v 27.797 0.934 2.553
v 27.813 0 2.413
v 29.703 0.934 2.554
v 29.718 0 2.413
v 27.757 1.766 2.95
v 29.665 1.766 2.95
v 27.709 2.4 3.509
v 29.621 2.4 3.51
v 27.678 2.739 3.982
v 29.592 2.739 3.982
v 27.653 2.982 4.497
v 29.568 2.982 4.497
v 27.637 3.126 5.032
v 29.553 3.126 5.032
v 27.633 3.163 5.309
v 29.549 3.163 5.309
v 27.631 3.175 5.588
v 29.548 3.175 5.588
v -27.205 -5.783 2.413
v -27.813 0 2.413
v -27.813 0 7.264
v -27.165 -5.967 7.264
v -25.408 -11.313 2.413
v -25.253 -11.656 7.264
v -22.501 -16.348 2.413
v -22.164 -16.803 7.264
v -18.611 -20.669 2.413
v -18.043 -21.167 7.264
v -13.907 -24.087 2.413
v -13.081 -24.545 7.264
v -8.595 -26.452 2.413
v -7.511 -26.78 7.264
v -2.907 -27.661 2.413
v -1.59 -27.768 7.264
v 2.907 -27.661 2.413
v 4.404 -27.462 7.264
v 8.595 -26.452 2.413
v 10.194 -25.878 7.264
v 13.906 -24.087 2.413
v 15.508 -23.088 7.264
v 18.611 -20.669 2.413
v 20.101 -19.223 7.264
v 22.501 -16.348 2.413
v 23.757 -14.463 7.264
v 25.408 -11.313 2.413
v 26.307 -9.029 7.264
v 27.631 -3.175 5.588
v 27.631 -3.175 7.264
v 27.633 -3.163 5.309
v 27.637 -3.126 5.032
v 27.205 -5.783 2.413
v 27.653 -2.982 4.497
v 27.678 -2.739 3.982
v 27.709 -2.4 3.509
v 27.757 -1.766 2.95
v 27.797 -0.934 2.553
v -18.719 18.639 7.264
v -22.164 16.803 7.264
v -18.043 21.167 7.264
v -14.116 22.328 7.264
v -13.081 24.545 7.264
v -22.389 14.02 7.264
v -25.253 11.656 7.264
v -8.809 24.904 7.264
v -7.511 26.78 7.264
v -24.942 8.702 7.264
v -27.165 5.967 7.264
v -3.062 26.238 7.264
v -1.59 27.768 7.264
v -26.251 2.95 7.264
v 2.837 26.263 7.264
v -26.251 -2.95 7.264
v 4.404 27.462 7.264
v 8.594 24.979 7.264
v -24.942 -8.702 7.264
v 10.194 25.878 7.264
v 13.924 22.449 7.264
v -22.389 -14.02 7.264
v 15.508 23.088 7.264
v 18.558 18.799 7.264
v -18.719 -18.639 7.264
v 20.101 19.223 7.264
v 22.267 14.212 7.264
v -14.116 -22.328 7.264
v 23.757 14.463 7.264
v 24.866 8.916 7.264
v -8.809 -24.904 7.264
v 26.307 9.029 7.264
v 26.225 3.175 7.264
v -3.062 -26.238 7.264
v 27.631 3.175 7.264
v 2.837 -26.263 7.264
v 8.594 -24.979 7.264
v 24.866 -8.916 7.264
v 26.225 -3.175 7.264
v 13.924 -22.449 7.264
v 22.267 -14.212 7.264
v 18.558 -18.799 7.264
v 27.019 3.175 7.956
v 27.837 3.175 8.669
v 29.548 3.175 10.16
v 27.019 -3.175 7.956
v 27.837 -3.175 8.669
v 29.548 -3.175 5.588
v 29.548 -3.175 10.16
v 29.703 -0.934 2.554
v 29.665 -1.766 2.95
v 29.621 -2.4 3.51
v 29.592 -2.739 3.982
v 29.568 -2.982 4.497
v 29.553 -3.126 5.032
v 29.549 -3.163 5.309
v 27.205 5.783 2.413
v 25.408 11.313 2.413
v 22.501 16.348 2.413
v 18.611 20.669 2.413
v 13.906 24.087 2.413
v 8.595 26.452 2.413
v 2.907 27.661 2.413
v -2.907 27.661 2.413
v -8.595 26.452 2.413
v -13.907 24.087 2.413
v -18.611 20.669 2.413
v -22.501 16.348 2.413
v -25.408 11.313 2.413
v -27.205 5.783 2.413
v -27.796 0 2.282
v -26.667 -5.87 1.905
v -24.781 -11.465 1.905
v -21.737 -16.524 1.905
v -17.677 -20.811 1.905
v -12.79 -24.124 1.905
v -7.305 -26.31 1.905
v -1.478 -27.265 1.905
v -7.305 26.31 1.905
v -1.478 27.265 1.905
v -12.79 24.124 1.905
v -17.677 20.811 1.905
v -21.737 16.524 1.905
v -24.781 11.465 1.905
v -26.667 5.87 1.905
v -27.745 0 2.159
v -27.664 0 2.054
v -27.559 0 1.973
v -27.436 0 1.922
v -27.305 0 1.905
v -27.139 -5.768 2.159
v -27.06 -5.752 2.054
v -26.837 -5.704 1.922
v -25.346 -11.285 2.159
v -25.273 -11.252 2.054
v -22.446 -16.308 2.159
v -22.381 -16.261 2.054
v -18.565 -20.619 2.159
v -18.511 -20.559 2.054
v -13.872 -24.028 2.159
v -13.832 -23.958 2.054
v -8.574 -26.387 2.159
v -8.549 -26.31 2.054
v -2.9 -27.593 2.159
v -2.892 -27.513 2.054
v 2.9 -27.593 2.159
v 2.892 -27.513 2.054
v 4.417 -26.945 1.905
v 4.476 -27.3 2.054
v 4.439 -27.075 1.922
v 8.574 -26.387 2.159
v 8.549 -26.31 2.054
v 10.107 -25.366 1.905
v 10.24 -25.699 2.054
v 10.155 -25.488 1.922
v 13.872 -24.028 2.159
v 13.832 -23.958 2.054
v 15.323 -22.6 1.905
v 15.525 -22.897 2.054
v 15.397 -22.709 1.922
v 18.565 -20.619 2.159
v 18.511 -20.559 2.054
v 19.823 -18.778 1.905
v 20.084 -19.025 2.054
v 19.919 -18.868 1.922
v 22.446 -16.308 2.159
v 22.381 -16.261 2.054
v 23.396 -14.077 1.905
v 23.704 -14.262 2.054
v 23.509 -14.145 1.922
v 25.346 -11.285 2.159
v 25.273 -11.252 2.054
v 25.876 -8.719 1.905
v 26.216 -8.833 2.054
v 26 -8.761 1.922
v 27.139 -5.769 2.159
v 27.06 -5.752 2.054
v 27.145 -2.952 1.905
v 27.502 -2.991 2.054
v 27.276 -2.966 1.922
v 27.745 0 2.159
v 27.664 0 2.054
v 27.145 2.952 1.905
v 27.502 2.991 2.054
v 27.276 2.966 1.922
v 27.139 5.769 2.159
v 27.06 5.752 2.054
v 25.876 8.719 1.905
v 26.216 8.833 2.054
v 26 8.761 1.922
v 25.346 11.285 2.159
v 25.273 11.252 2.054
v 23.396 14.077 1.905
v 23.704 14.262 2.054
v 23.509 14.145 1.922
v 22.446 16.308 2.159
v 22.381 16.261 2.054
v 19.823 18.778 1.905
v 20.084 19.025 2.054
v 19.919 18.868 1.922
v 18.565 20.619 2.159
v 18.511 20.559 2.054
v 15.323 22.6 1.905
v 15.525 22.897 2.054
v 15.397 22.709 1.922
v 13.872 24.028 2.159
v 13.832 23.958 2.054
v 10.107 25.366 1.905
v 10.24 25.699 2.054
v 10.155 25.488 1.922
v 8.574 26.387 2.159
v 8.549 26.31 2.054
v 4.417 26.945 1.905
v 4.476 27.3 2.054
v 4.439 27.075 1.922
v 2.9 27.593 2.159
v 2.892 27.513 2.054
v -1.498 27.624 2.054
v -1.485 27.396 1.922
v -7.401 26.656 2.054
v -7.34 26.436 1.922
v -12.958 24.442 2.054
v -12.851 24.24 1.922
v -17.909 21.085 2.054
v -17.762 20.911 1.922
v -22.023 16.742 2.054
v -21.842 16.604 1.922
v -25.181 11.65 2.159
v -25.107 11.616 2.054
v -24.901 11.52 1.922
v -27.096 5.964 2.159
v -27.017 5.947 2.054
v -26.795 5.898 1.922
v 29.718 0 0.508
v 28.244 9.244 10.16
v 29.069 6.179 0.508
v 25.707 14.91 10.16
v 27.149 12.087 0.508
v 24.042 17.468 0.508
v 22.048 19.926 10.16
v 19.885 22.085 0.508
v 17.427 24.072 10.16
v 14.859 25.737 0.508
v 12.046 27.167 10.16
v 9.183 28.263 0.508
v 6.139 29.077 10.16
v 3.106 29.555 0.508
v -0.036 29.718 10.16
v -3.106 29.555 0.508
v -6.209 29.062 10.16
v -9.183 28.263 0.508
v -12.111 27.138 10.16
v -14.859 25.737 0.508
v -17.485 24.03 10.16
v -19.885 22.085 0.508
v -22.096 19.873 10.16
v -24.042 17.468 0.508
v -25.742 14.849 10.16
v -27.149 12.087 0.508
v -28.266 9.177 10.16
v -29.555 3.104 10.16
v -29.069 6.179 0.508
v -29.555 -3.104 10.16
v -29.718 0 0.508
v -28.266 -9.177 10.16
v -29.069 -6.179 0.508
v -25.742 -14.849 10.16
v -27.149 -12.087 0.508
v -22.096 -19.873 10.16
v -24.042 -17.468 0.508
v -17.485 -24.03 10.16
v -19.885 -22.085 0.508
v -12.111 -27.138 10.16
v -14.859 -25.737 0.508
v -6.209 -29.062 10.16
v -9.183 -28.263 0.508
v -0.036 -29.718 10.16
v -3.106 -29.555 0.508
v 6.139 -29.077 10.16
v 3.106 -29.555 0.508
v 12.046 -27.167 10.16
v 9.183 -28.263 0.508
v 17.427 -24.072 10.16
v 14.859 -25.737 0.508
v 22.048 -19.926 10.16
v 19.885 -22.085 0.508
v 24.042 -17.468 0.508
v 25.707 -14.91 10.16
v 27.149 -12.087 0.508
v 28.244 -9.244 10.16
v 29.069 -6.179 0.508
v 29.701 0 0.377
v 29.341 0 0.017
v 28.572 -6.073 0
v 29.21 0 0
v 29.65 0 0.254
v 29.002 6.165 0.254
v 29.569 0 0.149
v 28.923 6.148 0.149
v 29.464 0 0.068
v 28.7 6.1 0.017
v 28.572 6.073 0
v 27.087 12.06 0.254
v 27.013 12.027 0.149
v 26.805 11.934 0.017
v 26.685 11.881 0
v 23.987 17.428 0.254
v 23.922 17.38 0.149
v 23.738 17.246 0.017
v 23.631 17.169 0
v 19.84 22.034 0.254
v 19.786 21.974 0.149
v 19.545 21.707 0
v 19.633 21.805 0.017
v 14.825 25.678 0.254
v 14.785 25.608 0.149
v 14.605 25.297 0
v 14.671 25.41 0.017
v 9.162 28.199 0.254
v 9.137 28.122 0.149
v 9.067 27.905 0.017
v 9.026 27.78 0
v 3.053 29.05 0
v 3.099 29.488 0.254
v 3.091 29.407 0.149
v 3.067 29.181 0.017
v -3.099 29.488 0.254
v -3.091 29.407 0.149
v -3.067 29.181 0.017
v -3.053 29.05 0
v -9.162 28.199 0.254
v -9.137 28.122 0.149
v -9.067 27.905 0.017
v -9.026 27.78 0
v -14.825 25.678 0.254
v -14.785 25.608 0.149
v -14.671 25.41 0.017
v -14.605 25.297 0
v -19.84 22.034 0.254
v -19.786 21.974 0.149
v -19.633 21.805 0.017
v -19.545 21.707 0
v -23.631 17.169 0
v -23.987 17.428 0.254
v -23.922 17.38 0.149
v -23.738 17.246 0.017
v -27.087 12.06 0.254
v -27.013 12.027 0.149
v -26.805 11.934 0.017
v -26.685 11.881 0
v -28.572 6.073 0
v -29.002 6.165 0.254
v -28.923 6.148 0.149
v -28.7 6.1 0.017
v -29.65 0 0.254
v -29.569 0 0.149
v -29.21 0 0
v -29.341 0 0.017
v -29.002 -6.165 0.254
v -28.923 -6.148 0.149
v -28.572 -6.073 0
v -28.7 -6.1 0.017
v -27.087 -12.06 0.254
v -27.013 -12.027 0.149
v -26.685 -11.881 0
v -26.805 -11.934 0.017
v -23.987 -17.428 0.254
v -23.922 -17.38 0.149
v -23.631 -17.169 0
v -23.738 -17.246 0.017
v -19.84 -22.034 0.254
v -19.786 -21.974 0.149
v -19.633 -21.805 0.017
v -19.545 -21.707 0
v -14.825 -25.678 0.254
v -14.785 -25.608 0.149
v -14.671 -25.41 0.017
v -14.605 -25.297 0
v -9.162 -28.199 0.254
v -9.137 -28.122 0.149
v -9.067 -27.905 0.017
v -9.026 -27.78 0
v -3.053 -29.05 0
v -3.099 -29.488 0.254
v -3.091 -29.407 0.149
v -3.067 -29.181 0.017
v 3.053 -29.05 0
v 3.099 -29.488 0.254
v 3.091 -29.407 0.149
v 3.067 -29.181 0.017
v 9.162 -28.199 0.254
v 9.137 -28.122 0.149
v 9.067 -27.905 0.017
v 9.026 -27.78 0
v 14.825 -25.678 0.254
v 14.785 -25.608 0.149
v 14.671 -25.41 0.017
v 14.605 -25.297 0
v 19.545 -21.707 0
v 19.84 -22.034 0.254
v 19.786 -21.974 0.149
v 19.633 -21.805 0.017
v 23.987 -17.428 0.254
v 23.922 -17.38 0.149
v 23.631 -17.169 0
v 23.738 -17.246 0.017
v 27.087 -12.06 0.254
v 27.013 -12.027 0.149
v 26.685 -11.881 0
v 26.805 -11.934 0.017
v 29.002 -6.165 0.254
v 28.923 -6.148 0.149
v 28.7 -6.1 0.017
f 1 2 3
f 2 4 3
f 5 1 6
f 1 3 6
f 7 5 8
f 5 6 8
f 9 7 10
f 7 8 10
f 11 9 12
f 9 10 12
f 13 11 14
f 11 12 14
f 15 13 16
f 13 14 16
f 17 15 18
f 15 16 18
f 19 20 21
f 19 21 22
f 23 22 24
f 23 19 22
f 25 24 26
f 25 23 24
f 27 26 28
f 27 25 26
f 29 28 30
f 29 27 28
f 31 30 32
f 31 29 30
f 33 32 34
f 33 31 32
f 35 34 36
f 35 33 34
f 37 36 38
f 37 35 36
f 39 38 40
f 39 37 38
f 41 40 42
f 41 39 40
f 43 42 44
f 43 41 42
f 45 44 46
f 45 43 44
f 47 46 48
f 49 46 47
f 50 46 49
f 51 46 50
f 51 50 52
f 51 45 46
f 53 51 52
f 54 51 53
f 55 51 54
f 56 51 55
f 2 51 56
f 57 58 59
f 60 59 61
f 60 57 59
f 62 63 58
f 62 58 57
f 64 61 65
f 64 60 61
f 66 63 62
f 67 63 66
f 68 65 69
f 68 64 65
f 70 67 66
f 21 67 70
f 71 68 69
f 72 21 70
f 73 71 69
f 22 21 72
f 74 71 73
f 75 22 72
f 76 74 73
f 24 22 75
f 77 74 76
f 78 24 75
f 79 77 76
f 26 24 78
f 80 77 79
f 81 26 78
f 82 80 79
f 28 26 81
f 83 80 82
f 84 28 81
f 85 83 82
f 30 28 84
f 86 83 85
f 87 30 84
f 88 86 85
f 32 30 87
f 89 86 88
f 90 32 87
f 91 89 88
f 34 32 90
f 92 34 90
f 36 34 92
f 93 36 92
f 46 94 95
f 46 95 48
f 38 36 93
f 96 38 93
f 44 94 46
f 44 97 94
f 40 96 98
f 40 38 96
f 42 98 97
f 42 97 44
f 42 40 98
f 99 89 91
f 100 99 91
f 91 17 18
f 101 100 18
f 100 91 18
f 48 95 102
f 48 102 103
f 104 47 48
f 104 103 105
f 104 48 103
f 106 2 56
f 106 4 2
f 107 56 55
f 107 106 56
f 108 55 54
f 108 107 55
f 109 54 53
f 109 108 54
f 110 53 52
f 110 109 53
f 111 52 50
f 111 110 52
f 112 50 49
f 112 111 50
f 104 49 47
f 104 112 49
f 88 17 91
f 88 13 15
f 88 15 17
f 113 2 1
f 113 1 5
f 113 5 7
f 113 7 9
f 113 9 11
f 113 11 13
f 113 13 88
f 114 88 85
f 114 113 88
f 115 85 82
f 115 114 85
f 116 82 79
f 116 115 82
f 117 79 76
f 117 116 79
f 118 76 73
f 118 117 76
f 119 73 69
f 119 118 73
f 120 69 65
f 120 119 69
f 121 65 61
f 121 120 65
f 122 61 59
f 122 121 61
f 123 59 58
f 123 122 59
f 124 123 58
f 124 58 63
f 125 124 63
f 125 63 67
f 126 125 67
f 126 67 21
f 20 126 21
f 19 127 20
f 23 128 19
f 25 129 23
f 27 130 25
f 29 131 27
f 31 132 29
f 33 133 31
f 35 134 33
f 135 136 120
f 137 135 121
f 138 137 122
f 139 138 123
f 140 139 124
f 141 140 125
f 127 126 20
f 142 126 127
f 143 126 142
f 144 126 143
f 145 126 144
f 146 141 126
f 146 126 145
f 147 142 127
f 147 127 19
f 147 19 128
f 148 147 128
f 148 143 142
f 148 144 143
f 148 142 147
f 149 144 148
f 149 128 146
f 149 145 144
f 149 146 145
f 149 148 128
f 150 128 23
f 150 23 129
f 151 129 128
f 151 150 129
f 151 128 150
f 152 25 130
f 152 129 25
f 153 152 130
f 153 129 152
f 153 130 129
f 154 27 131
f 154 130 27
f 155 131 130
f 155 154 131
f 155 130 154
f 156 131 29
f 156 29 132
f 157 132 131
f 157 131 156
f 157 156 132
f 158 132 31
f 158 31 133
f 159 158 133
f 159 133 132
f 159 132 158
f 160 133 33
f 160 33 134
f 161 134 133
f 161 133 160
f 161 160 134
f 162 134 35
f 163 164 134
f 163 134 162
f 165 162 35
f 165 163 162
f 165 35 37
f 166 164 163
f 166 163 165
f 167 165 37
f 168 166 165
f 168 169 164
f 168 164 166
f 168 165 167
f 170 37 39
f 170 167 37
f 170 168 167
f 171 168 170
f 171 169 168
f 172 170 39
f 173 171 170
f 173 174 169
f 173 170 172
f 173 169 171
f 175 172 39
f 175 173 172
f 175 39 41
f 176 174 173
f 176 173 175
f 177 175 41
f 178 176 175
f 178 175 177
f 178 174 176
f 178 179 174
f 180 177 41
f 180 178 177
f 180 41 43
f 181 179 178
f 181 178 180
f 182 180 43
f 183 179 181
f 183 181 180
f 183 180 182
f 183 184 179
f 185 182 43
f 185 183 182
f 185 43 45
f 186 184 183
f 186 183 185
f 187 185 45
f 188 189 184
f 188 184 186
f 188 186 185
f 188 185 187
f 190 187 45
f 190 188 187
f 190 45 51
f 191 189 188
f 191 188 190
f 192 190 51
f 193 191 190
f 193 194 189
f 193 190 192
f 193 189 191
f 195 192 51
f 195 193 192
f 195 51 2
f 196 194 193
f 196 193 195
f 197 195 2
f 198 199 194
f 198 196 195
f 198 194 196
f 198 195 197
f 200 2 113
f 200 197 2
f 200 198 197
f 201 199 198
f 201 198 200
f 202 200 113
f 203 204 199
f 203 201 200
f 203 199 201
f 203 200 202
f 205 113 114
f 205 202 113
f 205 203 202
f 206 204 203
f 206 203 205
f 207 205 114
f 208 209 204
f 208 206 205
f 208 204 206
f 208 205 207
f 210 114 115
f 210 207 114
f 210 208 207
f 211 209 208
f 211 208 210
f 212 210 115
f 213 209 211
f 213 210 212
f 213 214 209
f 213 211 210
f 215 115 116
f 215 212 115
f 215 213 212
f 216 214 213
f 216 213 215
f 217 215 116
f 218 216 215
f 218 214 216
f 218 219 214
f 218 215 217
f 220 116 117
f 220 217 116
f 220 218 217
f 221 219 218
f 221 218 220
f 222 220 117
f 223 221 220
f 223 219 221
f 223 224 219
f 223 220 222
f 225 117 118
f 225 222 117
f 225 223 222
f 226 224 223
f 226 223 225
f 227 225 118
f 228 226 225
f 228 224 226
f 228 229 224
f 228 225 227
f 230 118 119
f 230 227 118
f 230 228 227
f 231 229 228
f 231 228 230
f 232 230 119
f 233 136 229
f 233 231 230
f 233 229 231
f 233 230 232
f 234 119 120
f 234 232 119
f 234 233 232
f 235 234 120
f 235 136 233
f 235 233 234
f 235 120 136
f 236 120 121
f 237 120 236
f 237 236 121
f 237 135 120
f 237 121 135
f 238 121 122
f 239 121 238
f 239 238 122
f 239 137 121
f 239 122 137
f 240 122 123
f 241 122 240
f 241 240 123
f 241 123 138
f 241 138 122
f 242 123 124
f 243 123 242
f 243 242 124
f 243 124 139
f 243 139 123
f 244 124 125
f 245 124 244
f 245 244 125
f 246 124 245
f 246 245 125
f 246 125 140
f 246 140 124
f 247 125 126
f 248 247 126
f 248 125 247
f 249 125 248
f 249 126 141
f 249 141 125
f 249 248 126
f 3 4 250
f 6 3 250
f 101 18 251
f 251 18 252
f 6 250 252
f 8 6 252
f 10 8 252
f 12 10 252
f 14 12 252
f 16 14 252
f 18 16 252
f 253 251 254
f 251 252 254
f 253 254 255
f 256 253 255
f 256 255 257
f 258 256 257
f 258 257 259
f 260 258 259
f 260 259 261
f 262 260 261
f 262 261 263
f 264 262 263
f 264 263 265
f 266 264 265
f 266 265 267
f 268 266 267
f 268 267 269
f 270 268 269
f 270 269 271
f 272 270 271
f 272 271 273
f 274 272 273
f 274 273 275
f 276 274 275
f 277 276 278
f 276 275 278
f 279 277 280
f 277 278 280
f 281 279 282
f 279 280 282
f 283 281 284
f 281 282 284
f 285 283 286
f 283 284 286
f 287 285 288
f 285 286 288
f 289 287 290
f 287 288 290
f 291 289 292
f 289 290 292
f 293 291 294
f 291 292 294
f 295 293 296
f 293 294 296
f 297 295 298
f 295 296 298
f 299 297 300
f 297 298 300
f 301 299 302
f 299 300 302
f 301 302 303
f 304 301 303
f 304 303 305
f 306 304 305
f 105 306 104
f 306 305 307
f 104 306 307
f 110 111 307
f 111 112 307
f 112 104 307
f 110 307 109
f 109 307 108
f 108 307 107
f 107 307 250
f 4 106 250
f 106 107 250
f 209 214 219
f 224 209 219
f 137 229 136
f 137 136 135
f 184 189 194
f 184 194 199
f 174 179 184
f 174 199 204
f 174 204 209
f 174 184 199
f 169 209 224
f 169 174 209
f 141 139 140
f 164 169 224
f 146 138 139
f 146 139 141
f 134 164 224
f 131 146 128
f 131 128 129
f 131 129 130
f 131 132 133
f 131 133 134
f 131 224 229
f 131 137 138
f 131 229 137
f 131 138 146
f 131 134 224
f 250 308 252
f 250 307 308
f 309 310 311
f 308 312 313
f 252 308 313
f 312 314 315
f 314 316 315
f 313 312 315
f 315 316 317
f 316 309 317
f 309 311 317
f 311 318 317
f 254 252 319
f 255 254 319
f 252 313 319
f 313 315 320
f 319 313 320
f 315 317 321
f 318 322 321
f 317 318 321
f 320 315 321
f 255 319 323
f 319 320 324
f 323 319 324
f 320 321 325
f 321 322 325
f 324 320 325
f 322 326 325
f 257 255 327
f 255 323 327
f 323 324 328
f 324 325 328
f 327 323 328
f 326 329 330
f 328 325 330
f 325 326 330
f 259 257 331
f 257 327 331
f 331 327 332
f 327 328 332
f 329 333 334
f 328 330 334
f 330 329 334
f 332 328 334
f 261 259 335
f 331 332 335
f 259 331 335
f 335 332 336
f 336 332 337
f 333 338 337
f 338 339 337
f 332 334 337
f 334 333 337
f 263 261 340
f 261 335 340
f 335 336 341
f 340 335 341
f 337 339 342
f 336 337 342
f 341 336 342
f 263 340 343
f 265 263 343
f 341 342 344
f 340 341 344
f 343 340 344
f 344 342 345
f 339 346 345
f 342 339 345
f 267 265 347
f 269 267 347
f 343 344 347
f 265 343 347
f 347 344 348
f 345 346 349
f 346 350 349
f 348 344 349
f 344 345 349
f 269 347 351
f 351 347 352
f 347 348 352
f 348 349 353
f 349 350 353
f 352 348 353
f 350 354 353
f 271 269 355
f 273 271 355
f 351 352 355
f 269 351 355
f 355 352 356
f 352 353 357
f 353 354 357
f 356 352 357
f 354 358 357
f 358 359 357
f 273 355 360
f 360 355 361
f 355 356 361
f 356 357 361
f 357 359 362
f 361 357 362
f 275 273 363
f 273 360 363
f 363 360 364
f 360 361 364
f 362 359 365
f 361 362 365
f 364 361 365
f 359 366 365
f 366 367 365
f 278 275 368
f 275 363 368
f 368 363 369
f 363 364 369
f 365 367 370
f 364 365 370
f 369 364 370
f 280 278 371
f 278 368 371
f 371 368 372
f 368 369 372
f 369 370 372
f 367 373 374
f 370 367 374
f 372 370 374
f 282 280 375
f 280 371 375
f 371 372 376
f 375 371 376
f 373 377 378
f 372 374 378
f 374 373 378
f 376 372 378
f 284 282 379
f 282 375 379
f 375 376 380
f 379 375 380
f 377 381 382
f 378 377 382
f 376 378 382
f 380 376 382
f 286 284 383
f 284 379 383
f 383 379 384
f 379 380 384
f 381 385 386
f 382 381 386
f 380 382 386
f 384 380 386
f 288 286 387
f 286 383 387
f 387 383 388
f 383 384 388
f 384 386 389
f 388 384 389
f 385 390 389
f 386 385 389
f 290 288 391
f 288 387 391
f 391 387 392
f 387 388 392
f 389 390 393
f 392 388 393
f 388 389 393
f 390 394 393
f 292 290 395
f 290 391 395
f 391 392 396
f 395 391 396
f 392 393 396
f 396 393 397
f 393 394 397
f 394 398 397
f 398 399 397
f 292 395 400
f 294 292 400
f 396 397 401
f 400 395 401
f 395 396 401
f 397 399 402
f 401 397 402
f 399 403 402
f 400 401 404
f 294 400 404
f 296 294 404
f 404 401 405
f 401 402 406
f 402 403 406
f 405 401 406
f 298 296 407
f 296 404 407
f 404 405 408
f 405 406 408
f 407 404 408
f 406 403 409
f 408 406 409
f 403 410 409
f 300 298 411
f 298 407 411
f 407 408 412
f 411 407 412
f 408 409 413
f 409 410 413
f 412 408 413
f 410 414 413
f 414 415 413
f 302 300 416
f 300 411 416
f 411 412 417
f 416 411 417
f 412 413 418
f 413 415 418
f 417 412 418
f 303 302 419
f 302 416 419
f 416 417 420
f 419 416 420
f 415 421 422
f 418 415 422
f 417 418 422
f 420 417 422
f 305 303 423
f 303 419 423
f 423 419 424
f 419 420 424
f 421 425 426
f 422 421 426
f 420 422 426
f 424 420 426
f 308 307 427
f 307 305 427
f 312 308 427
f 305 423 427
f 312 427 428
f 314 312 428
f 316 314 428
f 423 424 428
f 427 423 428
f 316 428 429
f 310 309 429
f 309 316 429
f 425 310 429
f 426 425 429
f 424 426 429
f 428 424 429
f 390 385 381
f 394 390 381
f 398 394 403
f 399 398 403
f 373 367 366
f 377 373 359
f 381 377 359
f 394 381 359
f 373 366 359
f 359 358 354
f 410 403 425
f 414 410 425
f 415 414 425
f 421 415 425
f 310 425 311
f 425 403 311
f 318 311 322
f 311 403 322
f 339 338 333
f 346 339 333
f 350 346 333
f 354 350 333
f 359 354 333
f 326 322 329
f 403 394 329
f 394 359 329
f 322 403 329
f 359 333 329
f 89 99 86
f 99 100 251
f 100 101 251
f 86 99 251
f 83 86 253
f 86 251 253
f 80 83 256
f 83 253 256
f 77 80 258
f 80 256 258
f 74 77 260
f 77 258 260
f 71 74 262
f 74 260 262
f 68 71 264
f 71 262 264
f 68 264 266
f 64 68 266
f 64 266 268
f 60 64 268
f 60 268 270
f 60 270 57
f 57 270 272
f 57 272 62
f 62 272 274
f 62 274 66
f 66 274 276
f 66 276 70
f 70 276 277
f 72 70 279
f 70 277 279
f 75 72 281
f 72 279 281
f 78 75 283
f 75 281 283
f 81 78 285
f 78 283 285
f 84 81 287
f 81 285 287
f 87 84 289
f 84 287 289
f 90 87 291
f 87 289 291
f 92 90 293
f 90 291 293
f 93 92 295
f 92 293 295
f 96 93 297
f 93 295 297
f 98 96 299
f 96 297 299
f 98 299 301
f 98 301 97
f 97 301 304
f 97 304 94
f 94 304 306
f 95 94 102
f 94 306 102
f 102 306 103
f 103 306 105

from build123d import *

# Parameters (mm, degrees)
F0_R     = 29.718
F1_DEPTH = 10.16
F6_R     = 0.508
F8_W     = 4.7481491719
F8_H     = 6.35
F9_DEPTH = 25.4
F10_R    = 3.17499


# Not quite as in the source:
# - a fillet or chamfer is up to 0.001 mm smaller than in the source, because OpenCascade refuses the exact size


with BuildPart() as f1:
    # F0 (on Top) → F1 (new body)
    with BuildSketch(Plane.XY):
        Circle(F0_R)
    extrude(amount=F1_DEPTH)

    # F2 (on Front) → F3 (revolve, cut)
    with BuildSketch(Plane.XZ):
        Polygon((29.718, 10.16), (0, 10.16), (0, 7.2644), (26.416, 7.2644), align=None)
    revolve(axis=Axis((0, 0, 8.7122), (0, 0, 1)), mode=Mode.SUBTRACT)

    # F4 (on Front) → F5 (revolve, cut)
    with BuildSketch(Plane.XZ):
        Polygon((0, 7.2644), (-26.416, 7.2644), (-27.813, 7.2644), (-27.813, 1.905), (0, 1.905), align=None)
    revolve(axis=Axis((0, 0, 4.5847), (0, 0, 1)), mode=Mode.SUBTRACT)

    # F6
    f6_edges = [f1.edges().sort_by_distance(p)[0] for p in [
        (27.813, 0, 1.905),
        (-29.718, 0, 0),
    ]]
    fillet(f6_edges, radius=F6_R)

    # F8 (on face) → F9 (cut)
    with BuildSketch(Plane.XY.offset(2.413)):
        with Locations((28.1168716028, 0)):
            Rectangle(F8_W, F8_H)
    extrude(amount=F9_DEPTH, mode=Mode.SUBTRACT)

    # F10 (radius 3.175 in the source; OpenCascade refuses exactly that, so slightly less here)
    f10_edges = [f1.edges().sort_by_distance(p)[0] for p in [
        (28.589546, 3.175, 2.413),
        (28.589546, -3.175, 2.413),
    ]]
    fillet(f10_edges, radius=F10_R)


solid = f1.part
